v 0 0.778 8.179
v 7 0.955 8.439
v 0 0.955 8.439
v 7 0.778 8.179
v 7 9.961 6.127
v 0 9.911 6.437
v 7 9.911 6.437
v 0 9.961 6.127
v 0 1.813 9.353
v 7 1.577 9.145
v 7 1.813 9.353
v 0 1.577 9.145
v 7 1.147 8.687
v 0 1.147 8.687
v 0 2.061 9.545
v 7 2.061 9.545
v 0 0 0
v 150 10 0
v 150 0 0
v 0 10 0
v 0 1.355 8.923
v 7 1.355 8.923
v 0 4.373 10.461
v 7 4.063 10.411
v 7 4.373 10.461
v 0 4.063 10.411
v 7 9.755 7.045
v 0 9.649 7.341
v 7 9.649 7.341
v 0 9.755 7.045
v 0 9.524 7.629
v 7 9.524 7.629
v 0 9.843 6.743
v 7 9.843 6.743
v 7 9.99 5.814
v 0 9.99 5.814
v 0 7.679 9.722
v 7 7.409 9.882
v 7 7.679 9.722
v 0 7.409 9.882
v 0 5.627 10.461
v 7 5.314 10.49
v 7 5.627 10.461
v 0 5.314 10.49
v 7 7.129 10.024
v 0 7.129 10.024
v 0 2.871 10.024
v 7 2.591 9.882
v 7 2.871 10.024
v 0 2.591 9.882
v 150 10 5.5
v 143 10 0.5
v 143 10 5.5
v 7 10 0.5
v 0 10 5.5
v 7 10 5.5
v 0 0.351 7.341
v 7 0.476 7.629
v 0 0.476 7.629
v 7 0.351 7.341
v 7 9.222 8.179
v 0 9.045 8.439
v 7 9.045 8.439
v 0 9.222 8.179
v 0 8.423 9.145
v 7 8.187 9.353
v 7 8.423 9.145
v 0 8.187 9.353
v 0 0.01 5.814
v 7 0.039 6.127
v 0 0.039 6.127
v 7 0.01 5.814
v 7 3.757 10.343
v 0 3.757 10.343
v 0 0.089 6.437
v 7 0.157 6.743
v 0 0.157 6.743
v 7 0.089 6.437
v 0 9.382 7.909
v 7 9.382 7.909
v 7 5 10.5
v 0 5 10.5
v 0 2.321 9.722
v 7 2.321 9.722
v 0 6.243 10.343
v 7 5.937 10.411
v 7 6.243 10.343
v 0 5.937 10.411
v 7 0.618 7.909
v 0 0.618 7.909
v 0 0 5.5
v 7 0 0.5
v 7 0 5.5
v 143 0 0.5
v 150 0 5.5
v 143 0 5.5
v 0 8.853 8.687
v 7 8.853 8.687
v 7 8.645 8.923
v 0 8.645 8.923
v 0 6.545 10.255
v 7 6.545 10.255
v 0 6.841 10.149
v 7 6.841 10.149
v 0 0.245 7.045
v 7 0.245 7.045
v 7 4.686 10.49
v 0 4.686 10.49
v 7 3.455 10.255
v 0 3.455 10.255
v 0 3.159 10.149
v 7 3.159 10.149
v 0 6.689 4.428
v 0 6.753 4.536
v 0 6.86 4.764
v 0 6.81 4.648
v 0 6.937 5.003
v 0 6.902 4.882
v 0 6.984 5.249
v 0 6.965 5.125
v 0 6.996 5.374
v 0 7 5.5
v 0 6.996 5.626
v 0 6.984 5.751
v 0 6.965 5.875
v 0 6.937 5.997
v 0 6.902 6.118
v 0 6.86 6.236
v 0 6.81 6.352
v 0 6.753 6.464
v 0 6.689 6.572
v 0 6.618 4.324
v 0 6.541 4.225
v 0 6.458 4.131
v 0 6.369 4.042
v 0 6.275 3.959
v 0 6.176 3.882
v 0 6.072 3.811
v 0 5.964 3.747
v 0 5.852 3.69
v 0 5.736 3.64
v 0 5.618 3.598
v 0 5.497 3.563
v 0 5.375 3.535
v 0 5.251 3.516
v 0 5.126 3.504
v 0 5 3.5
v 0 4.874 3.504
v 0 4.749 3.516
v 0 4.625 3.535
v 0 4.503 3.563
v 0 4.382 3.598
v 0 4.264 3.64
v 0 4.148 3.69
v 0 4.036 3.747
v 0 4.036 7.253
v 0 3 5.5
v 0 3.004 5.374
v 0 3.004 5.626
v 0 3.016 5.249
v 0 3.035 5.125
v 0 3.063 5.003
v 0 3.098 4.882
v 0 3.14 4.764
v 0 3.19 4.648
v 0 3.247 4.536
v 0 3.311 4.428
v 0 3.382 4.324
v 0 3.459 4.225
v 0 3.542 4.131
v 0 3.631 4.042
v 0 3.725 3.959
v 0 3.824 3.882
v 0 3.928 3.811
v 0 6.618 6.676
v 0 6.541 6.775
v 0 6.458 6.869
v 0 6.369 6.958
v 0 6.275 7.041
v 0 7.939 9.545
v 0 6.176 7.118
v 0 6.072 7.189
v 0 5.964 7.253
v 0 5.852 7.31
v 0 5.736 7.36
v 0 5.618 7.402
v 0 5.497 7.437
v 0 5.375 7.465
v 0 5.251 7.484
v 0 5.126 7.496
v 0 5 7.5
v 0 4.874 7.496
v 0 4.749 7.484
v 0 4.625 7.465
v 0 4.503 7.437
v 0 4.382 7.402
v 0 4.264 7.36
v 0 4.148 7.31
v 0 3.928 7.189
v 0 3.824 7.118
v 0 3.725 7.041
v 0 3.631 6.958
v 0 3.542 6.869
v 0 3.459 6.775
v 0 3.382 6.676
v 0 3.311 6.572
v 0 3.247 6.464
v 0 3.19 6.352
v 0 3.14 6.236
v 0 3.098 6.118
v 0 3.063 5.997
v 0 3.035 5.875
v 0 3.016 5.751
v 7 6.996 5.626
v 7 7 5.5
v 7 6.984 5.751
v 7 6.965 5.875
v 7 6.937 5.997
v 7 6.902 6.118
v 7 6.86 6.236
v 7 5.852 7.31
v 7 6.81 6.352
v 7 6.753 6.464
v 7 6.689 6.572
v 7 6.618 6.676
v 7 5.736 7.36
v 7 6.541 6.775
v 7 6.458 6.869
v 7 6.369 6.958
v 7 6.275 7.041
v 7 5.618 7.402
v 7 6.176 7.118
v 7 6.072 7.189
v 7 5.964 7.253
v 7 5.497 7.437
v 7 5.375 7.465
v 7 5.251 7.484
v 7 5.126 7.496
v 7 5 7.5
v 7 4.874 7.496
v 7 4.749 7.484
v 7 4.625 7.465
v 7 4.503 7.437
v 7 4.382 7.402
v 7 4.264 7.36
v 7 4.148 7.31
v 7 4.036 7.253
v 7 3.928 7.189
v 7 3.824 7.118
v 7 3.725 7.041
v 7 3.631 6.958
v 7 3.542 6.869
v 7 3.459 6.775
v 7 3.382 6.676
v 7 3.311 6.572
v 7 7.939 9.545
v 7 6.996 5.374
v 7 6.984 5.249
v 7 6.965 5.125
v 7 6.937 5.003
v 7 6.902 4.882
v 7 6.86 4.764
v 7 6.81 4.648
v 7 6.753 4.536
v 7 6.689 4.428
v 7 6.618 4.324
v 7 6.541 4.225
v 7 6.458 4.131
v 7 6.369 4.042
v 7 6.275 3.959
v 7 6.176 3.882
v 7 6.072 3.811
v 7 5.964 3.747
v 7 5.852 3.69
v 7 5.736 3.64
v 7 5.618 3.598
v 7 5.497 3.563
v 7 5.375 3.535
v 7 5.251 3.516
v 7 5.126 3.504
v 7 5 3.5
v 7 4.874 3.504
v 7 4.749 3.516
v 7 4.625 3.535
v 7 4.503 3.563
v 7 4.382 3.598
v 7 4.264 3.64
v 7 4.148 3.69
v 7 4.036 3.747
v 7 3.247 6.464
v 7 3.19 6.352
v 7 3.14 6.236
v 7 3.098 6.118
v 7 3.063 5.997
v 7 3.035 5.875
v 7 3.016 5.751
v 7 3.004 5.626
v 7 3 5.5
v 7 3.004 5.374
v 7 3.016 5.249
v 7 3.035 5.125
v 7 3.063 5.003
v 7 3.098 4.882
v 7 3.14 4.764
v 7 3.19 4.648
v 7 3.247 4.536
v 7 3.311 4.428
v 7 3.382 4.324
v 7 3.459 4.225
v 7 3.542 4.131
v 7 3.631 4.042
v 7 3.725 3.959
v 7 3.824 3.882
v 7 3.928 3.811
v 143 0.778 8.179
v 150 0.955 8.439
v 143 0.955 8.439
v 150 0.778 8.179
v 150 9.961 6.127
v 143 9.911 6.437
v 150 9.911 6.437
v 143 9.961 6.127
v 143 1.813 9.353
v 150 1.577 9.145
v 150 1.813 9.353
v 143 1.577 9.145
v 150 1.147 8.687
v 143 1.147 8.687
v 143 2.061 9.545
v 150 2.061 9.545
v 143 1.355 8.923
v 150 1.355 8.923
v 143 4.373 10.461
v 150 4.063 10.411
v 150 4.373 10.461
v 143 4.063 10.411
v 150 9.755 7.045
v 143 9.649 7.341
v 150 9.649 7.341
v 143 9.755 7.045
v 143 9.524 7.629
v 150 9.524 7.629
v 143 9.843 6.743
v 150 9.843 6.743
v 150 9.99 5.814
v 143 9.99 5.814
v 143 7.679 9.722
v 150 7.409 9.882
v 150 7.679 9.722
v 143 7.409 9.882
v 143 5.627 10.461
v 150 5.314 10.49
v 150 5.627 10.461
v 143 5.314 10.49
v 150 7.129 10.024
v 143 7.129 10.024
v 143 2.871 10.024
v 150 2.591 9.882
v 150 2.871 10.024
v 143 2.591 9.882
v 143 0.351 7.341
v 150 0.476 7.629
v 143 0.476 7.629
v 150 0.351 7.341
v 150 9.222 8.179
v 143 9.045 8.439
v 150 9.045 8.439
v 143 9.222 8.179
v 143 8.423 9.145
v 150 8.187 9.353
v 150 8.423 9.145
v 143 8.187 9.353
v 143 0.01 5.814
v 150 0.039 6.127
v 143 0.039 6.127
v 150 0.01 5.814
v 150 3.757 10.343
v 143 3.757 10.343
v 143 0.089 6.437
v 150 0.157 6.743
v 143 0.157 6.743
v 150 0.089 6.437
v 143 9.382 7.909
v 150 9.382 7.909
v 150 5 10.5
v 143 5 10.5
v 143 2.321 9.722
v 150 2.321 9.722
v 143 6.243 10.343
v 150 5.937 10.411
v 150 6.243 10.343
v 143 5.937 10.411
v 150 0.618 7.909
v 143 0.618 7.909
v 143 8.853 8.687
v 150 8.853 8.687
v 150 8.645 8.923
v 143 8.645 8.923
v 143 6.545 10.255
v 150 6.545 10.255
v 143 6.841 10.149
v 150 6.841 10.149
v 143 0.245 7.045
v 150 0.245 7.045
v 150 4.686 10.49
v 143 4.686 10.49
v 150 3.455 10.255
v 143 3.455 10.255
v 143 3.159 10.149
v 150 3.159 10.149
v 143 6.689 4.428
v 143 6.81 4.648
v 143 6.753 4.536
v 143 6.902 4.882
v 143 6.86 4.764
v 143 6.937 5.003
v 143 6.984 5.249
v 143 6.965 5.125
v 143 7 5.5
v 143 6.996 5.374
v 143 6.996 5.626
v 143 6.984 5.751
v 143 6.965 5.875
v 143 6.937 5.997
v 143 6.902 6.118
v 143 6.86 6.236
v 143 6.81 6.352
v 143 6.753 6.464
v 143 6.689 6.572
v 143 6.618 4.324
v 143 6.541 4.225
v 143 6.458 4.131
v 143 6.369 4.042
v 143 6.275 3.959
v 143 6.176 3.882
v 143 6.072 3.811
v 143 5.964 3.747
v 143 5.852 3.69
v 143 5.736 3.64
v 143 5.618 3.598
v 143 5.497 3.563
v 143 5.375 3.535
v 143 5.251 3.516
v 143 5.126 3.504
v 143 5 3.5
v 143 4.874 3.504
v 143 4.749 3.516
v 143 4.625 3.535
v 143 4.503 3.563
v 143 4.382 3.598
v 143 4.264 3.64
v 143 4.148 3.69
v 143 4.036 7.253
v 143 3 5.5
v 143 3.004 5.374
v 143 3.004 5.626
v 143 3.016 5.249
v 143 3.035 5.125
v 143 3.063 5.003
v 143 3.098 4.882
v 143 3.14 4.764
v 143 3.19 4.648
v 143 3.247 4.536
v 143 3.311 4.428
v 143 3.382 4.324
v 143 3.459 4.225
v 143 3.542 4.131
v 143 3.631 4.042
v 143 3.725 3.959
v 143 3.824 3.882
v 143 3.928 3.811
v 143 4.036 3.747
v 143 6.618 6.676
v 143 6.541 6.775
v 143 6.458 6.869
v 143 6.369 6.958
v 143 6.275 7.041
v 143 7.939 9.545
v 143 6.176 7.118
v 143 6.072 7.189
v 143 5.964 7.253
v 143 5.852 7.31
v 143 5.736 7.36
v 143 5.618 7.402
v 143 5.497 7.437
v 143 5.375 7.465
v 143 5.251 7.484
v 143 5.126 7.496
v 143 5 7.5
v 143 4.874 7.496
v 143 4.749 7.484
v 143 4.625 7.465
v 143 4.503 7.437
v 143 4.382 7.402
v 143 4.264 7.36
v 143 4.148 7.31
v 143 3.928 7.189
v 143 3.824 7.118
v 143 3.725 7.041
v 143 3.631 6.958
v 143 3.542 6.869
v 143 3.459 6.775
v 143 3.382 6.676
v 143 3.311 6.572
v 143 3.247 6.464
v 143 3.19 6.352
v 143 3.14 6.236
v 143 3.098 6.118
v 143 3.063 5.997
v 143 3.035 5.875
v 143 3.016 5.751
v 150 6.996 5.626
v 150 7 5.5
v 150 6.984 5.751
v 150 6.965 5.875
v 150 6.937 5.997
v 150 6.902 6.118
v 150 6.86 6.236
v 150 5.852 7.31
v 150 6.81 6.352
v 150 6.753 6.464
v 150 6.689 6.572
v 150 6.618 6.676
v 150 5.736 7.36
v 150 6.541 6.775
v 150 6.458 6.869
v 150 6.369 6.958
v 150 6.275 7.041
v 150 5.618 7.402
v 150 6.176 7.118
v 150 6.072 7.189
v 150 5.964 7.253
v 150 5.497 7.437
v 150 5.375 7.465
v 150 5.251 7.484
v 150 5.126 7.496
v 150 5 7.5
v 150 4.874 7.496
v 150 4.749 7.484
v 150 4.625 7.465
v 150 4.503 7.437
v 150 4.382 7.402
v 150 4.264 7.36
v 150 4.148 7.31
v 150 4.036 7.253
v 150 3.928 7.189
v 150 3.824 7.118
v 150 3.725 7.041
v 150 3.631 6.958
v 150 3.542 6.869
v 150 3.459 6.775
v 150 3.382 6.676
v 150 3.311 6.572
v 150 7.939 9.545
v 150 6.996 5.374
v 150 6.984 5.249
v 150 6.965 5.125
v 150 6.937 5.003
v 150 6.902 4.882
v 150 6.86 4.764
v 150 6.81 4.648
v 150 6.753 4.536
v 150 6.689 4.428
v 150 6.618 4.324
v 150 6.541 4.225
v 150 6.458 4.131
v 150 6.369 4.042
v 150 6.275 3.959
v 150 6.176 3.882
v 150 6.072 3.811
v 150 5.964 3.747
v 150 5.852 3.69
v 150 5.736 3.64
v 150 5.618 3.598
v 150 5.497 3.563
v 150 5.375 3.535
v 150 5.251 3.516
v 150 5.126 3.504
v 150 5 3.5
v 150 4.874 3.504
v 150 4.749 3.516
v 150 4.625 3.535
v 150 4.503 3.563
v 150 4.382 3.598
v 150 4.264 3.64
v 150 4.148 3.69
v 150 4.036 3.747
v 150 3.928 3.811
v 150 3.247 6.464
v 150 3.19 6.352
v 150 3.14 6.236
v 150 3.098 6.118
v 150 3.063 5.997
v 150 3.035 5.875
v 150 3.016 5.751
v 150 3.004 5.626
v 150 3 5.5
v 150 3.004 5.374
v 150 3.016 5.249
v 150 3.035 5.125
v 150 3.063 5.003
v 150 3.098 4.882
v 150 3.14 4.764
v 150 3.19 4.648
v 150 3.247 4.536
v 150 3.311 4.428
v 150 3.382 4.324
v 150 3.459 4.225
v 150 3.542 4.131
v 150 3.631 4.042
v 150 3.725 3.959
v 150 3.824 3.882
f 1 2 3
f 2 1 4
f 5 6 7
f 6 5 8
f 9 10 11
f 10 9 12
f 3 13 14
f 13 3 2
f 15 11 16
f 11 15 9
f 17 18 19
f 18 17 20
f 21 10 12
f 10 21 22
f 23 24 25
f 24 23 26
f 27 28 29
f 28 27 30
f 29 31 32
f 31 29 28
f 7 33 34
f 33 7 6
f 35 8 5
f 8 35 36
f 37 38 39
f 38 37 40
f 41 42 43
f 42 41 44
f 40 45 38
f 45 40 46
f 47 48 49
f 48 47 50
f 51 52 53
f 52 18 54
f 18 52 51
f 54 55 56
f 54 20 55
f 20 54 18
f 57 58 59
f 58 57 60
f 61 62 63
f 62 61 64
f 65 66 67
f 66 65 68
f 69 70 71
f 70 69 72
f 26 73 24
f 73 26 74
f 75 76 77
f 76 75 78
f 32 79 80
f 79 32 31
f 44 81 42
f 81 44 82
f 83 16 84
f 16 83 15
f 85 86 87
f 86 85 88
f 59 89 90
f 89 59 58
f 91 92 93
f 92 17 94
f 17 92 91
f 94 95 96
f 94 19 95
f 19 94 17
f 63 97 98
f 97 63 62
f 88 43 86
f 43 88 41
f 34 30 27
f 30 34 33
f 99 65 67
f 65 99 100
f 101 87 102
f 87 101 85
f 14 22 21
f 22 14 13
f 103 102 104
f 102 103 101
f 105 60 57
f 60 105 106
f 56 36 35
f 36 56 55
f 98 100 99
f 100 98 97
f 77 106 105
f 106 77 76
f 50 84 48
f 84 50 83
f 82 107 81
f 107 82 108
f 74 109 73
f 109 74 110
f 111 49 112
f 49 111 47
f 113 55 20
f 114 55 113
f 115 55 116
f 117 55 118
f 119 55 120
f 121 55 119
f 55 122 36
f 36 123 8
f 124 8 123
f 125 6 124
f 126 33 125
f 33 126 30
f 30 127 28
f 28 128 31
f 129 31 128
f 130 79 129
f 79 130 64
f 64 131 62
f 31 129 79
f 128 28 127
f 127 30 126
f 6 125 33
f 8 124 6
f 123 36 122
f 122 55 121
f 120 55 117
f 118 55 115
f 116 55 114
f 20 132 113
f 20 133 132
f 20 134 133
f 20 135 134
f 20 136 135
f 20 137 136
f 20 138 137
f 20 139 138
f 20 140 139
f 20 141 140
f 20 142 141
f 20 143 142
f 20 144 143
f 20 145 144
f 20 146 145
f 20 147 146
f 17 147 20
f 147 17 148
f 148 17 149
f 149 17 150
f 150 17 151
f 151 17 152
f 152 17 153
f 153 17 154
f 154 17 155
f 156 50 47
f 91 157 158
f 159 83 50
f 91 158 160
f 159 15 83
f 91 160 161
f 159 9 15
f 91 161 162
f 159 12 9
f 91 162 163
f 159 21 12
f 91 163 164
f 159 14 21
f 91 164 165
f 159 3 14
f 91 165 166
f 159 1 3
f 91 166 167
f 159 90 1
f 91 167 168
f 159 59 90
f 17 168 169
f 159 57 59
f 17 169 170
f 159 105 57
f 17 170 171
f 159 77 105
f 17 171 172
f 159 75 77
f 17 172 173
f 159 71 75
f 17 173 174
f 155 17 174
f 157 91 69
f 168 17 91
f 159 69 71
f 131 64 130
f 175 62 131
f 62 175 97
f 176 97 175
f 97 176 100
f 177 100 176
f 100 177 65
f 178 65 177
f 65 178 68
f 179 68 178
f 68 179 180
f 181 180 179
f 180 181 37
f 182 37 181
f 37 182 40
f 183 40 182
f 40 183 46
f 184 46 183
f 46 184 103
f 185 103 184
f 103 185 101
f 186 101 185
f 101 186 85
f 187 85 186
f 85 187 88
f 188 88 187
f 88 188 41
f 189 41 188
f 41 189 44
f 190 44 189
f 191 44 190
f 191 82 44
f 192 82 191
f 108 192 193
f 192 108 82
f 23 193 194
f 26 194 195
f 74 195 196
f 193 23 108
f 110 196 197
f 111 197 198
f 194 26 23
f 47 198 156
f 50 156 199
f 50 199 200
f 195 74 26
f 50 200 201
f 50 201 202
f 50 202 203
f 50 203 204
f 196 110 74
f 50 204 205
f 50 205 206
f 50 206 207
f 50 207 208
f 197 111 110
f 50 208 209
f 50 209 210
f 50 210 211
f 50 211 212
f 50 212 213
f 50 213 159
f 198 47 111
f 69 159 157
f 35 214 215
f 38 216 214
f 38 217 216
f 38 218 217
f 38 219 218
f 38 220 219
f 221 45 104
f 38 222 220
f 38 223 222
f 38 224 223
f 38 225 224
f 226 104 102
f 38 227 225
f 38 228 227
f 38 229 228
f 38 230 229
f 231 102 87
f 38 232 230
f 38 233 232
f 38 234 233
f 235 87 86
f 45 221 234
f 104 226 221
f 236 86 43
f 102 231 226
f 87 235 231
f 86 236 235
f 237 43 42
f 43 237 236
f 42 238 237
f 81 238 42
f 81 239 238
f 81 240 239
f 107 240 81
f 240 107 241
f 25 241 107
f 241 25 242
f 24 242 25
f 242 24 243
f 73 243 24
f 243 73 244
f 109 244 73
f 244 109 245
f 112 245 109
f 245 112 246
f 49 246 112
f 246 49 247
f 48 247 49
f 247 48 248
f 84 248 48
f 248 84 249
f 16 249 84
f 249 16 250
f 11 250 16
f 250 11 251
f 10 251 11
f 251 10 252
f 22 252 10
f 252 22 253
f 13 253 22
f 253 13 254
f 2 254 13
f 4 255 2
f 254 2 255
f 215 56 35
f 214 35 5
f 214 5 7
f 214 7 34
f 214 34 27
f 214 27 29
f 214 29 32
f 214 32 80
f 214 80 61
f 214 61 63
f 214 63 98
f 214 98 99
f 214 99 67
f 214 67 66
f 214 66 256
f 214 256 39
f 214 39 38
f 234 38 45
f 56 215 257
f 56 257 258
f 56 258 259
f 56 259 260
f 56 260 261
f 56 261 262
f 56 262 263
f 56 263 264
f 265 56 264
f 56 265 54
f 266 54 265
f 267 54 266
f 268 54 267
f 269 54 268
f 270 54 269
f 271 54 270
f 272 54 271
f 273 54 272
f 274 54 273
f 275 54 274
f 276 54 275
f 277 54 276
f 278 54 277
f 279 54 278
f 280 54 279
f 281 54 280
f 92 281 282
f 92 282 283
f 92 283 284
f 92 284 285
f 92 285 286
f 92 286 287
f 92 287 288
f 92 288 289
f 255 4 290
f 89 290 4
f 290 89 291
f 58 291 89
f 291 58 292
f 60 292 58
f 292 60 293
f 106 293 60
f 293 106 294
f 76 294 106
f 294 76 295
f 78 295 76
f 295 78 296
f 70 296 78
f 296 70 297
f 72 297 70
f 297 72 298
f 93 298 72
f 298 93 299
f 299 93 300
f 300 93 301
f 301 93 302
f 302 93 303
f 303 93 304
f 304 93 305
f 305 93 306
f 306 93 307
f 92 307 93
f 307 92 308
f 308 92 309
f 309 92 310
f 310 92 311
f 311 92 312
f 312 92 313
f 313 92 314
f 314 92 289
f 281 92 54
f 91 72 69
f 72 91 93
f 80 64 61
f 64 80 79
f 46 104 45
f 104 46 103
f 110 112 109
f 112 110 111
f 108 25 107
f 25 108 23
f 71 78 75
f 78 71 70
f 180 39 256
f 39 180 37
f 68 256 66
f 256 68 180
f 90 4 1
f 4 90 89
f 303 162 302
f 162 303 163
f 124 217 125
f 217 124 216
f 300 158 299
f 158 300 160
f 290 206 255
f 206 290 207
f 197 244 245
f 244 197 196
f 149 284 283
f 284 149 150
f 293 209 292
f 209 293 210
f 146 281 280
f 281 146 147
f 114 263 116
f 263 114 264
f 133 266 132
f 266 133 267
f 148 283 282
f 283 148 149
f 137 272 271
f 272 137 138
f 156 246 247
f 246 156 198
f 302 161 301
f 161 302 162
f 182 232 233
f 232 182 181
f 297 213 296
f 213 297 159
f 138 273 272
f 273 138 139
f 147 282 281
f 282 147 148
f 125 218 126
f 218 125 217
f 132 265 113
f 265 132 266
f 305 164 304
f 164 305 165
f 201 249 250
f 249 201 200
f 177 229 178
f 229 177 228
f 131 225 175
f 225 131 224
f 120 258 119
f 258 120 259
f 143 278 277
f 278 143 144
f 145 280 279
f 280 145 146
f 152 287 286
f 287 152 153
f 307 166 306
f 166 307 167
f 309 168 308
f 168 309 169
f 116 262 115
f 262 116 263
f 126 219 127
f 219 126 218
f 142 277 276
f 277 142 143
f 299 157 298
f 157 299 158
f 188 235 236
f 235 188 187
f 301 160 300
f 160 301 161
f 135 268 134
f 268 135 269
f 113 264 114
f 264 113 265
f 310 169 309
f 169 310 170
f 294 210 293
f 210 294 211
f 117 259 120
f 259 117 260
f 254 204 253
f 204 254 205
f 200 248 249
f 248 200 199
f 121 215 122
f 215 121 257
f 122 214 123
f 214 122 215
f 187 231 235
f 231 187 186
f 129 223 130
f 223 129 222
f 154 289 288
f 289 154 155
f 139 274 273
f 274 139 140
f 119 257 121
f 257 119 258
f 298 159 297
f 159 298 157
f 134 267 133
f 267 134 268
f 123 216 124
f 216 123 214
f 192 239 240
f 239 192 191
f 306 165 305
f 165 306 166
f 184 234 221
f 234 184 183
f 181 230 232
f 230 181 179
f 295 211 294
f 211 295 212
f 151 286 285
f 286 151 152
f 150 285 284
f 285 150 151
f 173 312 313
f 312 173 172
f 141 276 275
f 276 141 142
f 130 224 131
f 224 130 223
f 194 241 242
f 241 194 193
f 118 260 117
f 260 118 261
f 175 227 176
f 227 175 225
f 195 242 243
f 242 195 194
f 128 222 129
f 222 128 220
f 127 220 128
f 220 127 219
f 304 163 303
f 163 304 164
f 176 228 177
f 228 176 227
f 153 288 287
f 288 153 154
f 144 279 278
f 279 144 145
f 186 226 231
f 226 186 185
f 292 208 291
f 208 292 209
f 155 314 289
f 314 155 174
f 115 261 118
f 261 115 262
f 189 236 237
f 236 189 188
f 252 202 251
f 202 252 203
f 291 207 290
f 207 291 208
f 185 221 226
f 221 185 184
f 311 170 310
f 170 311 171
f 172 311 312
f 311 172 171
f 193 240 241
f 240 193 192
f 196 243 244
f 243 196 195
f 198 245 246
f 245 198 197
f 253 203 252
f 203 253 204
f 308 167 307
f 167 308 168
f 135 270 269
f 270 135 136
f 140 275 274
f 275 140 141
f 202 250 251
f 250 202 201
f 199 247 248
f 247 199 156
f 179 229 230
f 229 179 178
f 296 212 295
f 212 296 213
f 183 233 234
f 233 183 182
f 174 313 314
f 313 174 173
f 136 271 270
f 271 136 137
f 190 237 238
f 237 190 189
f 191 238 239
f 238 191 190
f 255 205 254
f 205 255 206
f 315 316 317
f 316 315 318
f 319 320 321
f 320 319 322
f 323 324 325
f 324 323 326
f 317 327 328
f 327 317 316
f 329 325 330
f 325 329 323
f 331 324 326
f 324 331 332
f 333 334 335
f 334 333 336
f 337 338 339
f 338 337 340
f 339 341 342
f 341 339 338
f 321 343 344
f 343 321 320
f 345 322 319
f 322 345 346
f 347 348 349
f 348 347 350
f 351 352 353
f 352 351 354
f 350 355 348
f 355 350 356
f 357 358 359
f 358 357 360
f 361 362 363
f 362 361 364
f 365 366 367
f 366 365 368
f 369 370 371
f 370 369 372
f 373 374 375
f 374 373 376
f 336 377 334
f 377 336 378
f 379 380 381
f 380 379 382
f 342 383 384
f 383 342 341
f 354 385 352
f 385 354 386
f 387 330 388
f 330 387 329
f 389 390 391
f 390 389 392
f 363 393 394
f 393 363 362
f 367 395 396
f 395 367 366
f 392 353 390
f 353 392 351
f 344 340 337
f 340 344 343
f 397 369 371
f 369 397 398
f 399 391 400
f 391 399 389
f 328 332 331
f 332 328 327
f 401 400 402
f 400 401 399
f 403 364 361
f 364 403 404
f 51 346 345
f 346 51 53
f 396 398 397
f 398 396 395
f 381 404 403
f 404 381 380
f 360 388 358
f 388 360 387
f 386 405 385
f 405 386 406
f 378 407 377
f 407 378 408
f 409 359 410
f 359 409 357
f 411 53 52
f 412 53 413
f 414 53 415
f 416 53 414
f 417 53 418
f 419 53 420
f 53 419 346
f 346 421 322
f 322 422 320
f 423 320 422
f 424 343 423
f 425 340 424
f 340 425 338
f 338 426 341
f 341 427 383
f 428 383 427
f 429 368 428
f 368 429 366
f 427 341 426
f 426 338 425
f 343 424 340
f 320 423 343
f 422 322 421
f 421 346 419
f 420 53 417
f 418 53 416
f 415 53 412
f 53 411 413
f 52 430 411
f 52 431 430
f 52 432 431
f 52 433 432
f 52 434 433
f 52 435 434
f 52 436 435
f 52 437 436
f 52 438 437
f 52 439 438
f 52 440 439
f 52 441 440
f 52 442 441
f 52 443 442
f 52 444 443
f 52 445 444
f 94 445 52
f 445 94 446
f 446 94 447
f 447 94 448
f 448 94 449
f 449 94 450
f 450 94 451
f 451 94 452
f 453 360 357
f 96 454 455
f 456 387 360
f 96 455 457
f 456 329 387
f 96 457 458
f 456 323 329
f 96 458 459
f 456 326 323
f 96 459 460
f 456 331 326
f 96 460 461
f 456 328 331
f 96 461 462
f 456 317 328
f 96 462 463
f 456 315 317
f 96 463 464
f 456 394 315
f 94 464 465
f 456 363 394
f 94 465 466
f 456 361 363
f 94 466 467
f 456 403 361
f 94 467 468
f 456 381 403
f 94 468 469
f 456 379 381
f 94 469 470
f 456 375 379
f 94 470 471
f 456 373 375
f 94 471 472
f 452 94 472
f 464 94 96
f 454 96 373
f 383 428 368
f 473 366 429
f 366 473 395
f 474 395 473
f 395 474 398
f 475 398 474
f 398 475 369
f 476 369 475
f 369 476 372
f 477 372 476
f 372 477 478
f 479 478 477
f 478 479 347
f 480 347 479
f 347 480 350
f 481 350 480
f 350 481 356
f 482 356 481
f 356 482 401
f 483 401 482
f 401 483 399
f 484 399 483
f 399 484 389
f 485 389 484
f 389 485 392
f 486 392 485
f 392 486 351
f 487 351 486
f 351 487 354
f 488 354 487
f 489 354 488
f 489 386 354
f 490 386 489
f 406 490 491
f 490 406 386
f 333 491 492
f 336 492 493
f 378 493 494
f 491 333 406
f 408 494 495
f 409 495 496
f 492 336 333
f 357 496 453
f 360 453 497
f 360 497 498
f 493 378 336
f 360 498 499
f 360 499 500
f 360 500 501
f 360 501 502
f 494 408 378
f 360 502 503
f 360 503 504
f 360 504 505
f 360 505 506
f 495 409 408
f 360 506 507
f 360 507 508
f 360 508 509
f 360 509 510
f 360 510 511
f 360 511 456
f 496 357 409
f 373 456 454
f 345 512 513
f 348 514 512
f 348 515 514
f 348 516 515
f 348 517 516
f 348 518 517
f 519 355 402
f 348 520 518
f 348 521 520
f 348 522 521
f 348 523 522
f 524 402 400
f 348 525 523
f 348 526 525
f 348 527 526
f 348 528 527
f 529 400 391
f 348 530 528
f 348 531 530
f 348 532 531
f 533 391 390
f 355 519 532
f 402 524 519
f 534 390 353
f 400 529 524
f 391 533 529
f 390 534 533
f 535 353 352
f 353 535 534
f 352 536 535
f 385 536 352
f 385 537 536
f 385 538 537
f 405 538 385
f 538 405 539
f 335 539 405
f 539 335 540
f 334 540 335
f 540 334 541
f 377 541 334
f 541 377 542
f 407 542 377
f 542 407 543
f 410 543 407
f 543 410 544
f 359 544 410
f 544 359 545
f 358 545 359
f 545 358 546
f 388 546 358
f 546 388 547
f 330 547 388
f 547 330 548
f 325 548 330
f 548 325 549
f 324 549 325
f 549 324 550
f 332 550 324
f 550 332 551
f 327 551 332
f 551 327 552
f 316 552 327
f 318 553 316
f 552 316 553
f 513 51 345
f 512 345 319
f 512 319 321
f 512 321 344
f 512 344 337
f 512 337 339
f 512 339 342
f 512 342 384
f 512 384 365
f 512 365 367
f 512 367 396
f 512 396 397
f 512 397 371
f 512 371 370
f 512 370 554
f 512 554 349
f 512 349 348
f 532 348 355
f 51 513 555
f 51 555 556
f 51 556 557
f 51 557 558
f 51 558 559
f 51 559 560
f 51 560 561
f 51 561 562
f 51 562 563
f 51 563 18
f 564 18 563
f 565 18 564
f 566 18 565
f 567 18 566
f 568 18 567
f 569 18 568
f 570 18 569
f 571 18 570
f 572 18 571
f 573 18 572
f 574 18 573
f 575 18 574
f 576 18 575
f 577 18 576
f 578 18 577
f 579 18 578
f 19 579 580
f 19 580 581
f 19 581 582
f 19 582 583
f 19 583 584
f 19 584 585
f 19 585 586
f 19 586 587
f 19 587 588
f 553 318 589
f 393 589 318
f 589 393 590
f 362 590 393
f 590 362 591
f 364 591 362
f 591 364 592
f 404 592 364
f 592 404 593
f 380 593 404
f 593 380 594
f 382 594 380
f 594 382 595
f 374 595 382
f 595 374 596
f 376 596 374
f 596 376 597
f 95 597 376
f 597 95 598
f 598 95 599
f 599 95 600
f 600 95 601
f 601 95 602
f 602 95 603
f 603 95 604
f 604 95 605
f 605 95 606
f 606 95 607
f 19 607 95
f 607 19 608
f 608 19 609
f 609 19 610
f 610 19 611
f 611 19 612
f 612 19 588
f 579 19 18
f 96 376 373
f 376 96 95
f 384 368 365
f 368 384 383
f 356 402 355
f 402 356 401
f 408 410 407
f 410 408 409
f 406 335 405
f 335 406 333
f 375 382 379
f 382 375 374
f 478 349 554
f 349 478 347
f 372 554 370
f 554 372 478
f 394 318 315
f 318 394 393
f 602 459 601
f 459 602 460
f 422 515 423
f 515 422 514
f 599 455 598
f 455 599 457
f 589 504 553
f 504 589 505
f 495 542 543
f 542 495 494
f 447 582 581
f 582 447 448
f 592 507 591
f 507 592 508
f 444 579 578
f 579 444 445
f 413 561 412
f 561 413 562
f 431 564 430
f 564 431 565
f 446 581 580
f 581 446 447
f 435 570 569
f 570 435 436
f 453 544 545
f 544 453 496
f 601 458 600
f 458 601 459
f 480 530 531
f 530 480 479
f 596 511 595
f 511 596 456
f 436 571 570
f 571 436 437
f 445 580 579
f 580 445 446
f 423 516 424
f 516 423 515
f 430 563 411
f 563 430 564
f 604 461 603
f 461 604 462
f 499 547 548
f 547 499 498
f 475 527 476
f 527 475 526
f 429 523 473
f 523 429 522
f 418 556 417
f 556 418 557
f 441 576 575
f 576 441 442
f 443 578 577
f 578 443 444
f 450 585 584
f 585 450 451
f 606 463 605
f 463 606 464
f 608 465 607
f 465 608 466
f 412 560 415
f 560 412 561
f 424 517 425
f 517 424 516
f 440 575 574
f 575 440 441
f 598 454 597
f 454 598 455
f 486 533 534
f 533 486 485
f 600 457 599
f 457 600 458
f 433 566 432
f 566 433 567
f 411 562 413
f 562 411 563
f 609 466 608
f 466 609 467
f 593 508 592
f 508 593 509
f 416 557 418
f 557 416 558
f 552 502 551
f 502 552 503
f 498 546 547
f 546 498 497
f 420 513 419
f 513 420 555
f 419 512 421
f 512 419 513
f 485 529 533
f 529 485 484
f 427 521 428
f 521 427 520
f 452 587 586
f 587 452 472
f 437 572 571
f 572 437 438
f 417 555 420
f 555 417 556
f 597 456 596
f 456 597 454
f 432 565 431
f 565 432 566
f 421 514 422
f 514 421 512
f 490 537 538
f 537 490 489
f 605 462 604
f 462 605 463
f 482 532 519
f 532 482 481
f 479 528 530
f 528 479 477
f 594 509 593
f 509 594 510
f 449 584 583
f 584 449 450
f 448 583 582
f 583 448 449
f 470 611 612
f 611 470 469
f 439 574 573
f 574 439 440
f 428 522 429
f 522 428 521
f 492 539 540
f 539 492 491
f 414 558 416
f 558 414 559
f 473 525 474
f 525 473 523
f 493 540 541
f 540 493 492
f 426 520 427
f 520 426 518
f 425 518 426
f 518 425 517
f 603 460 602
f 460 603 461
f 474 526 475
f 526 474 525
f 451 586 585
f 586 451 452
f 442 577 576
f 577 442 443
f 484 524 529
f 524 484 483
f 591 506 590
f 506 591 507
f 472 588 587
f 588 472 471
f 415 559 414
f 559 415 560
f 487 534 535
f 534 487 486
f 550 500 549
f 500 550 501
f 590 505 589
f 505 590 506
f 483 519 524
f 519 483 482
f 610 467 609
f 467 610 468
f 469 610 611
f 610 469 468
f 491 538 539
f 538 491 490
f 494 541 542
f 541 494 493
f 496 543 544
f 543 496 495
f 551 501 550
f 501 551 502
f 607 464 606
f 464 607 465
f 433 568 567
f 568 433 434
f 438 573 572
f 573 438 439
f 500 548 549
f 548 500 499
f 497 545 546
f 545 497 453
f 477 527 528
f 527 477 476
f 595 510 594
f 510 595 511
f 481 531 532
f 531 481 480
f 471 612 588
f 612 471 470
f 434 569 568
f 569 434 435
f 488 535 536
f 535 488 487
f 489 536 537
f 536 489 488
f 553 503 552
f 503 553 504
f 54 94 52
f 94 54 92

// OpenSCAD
// strap
// https://github.com/davidelliott/parametric-lab 
// License: CC-BY

// This design is for a strap which can be screwed down to secure objects
// The simple design allows for several straps to be screwed together
// to make a longer one. 
// This first version is meant for holding curved objects like bottles
// in a 180 degree curved strap

// TODO / ideas
// Option to screw directly down
// option to change angle of anchor

strap_x=150; // length
strap_y=10; // width
strap_z=0.5; //thickness

anchor_x=7; // shoud be small to minimise strain
anchor_y=strap_y; // make sure this is big enough for the screw head
anchor_z=10; // total height of the anchor excluding the strap itself
anchor_hole_d=4;

$fn=100;

// strap
cube([strap_x,strap_y,strap_z]);
anchor();
translate([strap_x-anchor_x,0,0])
anchor();

// anchor
module anchor(){
	difference(){
	hull(){
	cube([anchor_x,anchor_y,strap_z]);
	translate([0,strap_y/2,strap_z+anchor_z/2])
	rotate([0,90,0])
	cylinder(d=anchor_z,h=anchor_x);
	}
	translate([-1,strap_y/2,strap_z+anchor_z/2])
	rotate([0,90,0])
	cylinder(d=anchor_hole_d,h=anchor_x+2);
}
}

